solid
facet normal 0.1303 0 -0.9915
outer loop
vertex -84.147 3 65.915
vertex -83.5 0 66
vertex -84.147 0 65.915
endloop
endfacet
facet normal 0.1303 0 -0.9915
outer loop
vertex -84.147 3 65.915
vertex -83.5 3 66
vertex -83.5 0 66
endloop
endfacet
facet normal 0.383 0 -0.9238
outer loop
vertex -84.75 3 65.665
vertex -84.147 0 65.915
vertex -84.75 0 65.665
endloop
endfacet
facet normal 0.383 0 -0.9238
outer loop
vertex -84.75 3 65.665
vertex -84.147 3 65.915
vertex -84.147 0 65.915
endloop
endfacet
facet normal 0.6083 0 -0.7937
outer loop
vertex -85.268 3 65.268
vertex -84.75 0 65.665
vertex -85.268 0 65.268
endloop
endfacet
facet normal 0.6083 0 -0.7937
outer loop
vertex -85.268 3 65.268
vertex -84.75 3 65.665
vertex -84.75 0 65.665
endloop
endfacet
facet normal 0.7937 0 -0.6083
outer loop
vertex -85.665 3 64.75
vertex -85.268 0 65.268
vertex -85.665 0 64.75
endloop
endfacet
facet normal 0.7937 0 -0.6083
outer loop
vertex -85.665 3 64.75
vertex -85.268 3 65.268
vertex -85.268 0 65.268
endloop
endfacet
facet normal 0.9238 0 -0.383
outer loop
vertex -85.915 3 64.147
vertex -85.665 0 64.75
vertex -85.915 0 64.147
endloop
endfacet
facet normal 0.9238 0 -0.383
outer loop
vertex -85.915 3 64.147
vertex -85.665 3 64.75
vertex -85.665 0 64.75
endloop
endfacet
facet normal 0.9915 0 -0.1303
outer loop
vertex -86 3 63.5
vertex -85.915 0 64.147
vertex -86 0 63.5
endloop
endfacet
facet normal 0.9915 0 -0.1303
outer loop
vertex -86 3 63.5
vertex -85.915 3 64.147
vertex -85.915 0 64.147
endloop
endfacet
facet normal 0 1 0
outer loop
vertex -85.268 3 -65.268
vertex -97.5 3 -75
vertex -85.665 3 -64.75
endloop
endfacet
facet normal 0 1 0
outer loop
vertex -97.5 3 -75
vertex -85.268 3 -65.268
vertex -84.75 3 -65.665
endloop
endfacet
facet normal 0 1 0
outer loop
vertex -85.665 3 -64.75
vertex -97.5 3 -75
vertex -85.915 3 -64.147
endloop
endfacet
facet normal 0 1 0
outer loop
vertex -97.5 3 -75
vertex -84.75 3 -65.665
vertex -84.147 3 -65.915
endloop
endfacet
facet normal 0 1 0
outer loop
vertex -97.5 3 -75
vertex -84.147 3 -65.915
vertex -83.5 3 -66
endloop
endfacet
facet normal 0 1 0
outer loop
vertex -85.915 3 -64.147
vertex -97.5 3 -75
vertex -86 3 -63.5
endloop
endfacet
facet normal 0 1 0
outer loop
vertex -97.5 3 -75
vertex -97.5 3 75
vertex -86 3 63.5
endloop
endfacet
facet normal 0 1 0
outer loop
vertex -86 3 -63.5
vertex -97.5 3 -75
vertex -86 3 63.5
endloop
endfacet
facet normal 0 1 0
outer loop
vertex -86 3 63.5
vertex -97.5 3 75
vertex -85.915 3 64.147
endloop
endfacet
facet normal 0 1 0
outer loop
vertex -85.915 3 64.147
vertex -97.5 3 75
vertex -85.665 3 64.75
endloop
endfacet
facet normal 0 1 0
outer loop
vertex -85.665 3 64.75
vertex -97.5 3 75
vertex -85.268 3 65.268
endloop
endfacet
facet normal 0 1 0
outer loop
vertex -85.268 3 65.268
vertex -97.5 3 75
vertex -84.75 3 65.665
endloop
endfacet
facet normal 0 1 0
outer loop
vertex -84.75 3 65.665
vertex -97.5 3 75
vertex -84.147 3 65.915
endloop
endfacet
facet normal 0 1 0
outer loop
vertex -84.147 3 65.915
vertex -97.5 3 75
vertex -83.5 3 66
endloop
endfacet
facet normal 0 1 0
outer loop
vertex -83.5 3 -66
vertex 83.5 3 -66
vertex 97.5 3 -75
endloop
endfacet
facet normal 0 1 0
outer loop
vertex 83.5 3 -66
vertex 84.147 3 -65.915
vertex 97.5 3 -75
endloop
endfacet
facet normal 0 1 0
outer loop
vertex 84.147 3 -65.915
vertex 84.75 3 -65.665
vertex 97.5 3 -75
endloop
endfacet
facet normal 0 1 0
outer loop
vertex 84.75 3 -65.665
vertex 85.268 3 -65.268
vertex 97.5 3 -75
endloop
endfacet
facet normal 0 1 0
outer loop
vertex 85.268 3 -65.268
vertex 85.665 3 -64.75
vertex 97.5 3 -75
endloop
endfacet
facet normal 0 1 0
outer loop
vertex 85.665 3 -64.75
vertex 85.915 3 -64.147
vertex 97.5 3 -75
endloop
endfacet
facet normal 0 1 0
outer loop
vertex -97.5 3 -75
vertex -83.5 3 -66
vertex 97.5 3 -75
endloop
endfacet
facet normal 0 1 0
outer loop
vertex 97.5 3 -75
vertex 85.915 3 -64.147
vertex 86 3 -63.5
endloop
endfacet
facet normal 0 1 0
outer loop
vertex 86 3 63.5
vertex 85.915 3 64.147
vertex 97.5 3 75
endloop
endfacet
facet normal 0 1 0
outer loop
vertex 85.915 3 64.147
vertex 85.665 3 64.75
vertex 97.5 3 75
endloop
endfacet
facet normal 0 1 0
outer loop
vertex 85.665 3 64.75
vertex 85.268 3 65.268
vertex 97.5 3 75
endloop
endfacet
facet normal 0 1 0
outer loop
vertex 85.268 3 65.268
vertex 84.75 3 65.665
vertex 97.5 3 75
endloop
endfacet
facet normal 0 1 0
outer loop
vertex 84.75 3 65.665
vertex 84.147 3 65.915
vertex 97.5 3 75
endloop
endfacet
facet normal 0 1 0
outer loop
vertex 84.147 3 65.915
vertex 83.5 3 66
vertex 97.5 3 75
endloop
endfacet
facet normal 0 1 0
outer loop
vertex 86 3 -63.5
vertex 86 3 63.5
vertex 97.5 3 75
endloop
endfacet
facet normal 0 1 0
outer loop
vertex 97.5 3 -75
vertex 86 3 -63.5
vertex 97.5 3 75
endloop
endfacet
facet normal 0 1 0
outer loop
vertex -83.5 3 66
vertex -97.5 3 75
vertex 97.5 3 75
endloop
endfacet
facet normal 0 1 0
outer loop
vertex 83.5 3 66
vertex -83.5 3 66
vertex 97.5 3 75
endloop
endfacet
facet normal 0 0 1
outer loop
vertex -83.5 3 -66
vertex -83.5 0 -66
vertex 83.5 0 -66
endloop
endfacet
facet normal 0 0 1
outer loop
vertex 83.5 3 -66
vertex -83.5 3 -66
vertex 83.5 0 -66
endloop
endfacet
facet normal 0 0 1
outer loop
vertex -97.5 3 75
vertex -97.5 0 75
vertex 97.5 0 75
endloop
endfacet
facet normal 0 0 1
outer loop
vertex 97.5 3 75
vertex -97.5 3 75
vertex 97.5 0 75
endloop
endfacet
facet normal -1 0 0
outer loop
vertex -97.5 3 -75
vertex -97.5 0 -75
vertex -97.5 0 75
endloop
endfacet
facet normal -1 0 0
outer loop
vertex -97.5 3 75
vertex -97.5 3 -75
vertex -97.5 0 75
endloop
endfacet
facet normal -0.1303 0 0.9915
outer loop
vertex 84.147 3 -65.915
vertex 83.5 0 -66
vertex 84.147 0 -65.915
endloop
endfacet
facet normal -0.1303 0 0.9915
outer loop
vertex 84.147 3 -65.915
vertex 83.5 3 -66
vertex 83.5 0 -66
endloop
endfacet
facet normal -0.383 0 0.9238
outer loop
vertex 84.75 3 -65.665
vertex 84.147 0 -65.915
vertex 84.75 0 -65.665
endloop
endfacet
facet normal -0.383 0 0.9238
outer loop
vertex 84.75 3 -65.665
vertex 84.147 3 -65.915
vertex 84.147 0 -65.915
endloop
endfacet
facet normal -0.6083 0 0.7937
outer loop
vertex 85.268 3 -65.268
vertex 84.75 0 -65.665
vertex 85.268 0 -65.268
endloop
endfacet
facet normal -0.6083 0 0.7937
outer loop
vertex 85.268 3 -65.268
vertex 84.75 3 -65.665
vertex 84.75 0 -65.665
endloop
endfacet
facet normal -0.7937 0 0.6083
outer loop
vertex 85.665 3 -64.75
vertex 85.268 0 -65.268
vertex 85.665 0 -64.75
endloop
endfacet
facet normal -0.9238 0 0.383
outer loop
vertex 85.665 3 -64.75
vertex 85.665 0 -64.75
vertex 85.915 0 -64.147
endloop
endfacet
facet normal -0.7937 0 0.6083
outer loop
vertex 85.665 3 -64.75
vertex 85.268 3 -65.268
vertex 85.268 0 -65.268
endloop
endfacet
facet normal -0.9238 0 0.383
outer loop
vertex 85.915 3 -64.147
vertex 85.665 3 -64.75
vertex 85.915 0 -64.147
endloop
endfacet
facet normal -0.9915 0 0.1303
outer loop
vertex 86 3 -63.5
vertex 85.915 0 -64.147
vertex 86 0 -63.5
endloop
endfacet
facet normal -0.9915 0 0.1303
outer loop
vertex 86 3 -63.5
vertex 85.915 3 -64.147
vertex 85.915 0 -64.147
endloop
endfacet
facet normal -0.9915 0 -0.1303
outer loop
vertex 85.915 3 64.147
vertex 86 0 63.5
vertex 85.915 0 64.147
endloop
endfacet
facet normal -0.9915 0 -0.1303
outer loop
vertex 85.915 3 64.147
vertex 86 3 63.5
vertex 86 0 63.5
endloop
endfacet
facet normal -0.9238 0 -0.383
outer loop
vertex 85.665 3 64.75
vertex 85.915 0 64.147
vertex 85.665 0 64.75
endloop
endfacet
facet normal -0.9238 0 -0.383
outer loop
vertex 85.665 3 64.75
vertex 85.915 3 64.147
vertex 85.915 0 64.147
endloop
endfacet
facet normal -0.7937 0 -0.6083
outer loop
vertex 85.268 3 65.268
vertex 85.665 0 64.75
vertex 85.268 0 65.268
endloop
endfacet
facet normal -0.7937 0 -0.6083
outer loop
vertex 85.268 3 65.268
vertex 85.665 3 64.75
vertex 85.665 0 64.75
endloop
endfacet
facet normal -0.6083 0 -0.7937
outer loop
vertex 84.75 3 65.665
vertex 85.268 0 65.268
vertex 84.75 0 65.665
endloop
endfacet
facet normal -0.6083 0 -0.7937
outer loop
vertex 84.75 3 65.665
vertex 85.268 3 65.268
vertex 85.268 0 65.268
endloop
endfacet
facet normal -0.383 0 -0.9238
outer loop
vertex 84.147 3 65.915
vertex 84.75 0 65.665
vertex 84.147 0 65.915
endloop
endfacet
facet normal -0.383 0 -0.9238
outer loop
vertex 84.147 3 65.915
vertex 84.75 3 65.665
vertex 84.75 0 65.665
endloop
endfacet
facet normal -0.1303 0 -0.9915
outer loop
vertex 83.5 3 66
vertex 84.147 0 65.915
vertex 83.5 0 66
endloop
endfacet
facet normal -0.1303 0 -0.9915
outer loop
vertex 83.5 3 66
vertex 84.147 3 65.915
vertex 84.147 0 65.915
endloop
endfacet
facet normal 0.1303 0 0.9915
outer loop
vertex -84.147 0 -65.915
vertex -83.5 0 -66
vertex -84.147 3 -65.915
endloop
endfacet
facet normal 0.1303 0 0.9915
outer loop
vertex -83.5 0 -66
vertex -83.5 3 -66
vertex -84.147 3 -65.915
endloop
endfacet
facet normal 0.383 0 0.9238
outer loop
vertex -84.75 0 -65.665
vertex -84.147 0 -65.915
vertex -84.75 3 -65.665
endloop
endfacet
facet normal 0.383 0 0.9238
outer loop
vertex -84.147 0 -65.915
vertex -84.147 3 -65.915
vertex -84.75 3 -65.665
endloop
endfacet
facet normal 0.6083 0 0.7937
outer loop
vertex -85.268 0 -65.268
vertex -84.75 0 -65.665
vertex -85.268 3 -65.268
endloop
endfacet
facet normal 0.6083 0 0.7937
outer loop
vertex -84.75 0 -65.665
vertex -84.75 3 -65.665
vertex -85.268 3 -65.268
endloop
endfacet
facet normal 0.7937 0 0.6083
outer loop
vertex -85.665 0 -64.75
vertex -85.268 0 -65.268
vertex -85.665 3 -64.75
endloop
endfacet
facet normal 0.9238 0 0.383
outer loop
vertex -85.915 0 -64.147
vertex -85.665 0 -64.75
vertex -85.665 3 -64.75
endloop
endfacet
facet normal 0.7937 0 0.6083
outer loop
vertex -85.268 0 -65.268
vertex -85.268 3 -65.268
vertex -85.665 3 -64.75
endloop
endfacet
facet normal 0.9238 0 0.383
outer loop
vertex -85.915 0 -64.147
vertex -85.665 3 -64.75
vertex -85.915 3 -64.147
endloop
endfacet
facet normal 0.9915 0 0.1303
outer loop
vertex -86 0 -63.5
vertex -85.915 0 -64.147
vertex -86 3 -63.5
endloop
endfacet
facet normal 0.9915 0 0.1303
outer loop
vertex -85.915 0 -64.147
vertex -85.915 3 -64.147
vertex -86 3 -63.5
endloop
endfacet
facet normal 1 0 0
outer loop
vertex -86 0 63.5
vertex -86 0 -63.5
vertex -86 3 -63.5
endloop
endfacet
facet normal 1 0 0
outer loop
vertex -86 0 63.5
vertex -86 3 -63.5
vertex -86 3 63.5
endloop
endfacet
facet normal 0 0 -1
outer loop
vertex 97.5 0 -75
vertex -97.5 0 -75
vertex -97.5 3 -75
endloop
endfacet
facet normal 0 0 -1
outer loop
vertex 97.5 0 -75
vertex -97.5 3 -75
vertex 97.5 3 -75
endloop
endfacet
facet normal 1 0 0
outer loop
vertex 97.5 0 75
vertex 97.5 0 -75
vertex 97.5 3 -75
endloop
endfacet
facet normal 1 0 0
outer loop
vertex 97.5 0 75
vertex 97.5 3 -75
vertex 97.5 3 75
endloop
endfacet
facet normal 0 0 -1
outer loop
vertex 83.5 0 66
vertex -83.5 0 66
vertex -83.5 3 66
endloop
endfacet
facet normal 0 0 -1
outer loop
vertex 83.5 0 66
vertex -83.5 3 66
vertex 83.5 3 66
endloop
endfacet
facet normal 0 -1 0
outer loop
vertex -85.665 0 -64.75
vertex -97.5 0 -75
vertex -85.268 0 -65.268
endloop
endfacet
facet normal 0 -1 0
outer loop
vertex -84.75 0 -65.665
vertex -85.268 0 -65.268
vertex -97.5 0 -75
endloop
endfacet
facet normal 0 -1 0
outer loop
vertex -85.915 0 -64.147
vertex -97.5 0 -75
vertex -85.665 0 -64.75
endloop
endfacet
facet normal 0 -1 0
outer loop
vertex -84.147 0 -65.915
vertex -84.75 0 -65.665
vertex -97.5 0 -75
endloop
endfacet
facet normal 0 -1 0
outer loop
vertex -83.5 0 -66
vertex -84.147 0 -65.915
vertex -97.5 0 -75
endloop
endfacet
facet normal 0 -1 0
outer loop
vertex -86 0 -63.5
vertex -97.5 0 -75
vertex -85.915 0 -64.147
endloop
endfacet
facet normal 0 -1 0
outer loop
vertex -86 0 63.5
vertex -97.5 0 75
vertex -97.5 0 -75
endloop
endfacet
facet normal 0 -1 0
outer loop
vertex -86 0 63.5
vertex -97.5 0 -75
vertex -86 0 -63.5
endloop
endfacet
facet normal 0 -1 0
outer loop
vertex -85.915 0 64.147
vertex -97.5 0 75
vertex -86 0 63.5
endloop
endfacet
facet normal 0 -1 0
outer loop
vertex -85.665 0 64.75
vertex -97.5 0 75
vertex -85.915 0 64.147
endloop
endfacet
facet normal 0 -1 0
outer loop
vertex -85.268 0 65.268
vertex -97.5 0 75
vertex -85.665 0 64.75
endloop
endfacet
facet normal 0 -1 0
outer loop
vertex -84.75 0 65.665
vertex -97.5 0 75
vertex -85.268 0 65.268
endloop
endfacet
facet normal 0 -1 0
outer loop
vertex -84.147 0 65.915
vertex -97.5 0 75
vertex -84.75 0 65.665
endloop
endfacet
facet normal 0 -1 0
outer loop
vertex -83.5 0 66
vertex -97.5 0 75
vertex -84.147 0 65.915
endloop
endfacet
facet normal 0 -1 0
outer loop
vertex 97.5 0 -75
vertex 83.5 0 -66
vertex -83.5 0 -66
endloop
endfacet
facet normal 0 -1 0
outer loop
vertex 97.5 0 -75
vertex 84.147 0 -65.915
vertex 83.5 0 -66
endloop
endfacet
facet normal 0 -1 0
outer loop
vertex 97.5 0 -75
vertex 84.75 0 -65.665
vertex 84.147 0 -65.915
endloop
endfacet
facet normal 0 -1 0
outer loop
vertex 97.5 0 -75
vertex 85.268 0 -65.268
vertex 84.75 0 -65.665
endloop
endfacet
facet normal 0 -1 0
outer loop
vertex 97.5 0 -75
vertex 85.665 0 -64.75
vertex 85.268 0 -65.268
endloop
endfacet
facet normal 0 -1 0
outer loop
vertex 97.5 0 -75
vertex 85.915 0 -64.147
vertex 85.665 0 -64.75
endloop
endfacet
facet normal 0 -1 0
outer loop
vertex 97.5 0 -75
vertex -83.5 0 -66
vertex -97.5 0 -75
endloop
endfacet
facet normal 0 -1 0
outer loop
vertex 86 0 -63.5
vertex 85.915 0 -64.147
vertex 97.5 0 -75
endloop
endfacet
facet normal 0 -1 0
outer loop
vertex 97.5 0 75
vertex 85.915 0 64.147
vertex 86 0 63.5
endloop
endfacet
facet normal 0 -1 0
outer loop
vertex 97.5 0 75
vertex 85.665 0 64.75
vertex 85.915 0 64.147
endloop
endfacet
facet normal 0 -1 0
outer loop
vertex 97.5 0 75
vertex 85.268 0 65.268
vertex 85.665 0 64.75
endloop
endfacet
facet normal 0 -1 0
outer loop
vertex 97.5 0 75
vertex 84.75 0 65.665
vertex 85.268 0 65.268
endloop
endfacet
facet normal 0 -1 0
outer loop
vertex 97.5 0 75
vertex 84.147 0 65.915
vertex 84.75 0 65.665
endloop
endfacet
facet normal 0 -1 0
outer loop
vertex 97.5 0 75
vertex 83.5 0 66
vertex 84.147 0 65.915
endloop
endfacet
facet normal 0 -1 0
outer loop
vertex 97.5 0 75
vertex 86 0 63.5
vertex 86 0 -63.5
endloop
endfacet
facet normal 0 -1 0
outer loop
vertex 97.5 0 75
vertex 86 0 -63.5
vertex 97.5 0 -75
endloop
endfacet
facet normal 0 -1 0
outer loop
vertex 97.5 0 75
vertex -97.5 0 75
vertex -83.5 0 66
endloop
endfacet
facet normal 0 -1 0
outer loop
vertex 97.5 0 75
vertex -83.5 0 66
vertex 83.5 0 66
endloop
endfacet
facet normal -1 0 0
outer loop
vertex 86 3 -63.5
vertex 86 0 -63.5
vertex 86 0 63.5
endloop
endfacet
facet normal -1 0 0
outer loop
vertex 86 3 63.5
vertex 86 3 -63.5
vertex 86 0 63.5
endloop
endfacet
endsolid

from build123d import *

# Parameters (mm, degrees)
F0_W     = 195
F0_H     = 150
F0_W_2   = 172
F0_H_2   = 132
F1_DEPTH = 3
F2_R     = 2.5


with BuildPart() as f1:
    # F0 (on Front) → F1 (new body)
    with BuildSketch(Plane.XZ):
        Rectangle(F0_W, F0_H)
        Rectangle(F0_W_2, F0_H_2, mode=Mode.SUBTRACT)
    extrude(amount=-F1_DEPTH)

    # F2
    f2_edges = [f1.edges().sort_by_distance(p)[0] for p in [
        (-86, 1.5, -66),
        (86, 1.5, -66),
        (86, 1.5, 66),
        (-86, 1.5, 66),
    ]]
    fillet(f2_edges, radius=F2_R)


solid = f1.part
